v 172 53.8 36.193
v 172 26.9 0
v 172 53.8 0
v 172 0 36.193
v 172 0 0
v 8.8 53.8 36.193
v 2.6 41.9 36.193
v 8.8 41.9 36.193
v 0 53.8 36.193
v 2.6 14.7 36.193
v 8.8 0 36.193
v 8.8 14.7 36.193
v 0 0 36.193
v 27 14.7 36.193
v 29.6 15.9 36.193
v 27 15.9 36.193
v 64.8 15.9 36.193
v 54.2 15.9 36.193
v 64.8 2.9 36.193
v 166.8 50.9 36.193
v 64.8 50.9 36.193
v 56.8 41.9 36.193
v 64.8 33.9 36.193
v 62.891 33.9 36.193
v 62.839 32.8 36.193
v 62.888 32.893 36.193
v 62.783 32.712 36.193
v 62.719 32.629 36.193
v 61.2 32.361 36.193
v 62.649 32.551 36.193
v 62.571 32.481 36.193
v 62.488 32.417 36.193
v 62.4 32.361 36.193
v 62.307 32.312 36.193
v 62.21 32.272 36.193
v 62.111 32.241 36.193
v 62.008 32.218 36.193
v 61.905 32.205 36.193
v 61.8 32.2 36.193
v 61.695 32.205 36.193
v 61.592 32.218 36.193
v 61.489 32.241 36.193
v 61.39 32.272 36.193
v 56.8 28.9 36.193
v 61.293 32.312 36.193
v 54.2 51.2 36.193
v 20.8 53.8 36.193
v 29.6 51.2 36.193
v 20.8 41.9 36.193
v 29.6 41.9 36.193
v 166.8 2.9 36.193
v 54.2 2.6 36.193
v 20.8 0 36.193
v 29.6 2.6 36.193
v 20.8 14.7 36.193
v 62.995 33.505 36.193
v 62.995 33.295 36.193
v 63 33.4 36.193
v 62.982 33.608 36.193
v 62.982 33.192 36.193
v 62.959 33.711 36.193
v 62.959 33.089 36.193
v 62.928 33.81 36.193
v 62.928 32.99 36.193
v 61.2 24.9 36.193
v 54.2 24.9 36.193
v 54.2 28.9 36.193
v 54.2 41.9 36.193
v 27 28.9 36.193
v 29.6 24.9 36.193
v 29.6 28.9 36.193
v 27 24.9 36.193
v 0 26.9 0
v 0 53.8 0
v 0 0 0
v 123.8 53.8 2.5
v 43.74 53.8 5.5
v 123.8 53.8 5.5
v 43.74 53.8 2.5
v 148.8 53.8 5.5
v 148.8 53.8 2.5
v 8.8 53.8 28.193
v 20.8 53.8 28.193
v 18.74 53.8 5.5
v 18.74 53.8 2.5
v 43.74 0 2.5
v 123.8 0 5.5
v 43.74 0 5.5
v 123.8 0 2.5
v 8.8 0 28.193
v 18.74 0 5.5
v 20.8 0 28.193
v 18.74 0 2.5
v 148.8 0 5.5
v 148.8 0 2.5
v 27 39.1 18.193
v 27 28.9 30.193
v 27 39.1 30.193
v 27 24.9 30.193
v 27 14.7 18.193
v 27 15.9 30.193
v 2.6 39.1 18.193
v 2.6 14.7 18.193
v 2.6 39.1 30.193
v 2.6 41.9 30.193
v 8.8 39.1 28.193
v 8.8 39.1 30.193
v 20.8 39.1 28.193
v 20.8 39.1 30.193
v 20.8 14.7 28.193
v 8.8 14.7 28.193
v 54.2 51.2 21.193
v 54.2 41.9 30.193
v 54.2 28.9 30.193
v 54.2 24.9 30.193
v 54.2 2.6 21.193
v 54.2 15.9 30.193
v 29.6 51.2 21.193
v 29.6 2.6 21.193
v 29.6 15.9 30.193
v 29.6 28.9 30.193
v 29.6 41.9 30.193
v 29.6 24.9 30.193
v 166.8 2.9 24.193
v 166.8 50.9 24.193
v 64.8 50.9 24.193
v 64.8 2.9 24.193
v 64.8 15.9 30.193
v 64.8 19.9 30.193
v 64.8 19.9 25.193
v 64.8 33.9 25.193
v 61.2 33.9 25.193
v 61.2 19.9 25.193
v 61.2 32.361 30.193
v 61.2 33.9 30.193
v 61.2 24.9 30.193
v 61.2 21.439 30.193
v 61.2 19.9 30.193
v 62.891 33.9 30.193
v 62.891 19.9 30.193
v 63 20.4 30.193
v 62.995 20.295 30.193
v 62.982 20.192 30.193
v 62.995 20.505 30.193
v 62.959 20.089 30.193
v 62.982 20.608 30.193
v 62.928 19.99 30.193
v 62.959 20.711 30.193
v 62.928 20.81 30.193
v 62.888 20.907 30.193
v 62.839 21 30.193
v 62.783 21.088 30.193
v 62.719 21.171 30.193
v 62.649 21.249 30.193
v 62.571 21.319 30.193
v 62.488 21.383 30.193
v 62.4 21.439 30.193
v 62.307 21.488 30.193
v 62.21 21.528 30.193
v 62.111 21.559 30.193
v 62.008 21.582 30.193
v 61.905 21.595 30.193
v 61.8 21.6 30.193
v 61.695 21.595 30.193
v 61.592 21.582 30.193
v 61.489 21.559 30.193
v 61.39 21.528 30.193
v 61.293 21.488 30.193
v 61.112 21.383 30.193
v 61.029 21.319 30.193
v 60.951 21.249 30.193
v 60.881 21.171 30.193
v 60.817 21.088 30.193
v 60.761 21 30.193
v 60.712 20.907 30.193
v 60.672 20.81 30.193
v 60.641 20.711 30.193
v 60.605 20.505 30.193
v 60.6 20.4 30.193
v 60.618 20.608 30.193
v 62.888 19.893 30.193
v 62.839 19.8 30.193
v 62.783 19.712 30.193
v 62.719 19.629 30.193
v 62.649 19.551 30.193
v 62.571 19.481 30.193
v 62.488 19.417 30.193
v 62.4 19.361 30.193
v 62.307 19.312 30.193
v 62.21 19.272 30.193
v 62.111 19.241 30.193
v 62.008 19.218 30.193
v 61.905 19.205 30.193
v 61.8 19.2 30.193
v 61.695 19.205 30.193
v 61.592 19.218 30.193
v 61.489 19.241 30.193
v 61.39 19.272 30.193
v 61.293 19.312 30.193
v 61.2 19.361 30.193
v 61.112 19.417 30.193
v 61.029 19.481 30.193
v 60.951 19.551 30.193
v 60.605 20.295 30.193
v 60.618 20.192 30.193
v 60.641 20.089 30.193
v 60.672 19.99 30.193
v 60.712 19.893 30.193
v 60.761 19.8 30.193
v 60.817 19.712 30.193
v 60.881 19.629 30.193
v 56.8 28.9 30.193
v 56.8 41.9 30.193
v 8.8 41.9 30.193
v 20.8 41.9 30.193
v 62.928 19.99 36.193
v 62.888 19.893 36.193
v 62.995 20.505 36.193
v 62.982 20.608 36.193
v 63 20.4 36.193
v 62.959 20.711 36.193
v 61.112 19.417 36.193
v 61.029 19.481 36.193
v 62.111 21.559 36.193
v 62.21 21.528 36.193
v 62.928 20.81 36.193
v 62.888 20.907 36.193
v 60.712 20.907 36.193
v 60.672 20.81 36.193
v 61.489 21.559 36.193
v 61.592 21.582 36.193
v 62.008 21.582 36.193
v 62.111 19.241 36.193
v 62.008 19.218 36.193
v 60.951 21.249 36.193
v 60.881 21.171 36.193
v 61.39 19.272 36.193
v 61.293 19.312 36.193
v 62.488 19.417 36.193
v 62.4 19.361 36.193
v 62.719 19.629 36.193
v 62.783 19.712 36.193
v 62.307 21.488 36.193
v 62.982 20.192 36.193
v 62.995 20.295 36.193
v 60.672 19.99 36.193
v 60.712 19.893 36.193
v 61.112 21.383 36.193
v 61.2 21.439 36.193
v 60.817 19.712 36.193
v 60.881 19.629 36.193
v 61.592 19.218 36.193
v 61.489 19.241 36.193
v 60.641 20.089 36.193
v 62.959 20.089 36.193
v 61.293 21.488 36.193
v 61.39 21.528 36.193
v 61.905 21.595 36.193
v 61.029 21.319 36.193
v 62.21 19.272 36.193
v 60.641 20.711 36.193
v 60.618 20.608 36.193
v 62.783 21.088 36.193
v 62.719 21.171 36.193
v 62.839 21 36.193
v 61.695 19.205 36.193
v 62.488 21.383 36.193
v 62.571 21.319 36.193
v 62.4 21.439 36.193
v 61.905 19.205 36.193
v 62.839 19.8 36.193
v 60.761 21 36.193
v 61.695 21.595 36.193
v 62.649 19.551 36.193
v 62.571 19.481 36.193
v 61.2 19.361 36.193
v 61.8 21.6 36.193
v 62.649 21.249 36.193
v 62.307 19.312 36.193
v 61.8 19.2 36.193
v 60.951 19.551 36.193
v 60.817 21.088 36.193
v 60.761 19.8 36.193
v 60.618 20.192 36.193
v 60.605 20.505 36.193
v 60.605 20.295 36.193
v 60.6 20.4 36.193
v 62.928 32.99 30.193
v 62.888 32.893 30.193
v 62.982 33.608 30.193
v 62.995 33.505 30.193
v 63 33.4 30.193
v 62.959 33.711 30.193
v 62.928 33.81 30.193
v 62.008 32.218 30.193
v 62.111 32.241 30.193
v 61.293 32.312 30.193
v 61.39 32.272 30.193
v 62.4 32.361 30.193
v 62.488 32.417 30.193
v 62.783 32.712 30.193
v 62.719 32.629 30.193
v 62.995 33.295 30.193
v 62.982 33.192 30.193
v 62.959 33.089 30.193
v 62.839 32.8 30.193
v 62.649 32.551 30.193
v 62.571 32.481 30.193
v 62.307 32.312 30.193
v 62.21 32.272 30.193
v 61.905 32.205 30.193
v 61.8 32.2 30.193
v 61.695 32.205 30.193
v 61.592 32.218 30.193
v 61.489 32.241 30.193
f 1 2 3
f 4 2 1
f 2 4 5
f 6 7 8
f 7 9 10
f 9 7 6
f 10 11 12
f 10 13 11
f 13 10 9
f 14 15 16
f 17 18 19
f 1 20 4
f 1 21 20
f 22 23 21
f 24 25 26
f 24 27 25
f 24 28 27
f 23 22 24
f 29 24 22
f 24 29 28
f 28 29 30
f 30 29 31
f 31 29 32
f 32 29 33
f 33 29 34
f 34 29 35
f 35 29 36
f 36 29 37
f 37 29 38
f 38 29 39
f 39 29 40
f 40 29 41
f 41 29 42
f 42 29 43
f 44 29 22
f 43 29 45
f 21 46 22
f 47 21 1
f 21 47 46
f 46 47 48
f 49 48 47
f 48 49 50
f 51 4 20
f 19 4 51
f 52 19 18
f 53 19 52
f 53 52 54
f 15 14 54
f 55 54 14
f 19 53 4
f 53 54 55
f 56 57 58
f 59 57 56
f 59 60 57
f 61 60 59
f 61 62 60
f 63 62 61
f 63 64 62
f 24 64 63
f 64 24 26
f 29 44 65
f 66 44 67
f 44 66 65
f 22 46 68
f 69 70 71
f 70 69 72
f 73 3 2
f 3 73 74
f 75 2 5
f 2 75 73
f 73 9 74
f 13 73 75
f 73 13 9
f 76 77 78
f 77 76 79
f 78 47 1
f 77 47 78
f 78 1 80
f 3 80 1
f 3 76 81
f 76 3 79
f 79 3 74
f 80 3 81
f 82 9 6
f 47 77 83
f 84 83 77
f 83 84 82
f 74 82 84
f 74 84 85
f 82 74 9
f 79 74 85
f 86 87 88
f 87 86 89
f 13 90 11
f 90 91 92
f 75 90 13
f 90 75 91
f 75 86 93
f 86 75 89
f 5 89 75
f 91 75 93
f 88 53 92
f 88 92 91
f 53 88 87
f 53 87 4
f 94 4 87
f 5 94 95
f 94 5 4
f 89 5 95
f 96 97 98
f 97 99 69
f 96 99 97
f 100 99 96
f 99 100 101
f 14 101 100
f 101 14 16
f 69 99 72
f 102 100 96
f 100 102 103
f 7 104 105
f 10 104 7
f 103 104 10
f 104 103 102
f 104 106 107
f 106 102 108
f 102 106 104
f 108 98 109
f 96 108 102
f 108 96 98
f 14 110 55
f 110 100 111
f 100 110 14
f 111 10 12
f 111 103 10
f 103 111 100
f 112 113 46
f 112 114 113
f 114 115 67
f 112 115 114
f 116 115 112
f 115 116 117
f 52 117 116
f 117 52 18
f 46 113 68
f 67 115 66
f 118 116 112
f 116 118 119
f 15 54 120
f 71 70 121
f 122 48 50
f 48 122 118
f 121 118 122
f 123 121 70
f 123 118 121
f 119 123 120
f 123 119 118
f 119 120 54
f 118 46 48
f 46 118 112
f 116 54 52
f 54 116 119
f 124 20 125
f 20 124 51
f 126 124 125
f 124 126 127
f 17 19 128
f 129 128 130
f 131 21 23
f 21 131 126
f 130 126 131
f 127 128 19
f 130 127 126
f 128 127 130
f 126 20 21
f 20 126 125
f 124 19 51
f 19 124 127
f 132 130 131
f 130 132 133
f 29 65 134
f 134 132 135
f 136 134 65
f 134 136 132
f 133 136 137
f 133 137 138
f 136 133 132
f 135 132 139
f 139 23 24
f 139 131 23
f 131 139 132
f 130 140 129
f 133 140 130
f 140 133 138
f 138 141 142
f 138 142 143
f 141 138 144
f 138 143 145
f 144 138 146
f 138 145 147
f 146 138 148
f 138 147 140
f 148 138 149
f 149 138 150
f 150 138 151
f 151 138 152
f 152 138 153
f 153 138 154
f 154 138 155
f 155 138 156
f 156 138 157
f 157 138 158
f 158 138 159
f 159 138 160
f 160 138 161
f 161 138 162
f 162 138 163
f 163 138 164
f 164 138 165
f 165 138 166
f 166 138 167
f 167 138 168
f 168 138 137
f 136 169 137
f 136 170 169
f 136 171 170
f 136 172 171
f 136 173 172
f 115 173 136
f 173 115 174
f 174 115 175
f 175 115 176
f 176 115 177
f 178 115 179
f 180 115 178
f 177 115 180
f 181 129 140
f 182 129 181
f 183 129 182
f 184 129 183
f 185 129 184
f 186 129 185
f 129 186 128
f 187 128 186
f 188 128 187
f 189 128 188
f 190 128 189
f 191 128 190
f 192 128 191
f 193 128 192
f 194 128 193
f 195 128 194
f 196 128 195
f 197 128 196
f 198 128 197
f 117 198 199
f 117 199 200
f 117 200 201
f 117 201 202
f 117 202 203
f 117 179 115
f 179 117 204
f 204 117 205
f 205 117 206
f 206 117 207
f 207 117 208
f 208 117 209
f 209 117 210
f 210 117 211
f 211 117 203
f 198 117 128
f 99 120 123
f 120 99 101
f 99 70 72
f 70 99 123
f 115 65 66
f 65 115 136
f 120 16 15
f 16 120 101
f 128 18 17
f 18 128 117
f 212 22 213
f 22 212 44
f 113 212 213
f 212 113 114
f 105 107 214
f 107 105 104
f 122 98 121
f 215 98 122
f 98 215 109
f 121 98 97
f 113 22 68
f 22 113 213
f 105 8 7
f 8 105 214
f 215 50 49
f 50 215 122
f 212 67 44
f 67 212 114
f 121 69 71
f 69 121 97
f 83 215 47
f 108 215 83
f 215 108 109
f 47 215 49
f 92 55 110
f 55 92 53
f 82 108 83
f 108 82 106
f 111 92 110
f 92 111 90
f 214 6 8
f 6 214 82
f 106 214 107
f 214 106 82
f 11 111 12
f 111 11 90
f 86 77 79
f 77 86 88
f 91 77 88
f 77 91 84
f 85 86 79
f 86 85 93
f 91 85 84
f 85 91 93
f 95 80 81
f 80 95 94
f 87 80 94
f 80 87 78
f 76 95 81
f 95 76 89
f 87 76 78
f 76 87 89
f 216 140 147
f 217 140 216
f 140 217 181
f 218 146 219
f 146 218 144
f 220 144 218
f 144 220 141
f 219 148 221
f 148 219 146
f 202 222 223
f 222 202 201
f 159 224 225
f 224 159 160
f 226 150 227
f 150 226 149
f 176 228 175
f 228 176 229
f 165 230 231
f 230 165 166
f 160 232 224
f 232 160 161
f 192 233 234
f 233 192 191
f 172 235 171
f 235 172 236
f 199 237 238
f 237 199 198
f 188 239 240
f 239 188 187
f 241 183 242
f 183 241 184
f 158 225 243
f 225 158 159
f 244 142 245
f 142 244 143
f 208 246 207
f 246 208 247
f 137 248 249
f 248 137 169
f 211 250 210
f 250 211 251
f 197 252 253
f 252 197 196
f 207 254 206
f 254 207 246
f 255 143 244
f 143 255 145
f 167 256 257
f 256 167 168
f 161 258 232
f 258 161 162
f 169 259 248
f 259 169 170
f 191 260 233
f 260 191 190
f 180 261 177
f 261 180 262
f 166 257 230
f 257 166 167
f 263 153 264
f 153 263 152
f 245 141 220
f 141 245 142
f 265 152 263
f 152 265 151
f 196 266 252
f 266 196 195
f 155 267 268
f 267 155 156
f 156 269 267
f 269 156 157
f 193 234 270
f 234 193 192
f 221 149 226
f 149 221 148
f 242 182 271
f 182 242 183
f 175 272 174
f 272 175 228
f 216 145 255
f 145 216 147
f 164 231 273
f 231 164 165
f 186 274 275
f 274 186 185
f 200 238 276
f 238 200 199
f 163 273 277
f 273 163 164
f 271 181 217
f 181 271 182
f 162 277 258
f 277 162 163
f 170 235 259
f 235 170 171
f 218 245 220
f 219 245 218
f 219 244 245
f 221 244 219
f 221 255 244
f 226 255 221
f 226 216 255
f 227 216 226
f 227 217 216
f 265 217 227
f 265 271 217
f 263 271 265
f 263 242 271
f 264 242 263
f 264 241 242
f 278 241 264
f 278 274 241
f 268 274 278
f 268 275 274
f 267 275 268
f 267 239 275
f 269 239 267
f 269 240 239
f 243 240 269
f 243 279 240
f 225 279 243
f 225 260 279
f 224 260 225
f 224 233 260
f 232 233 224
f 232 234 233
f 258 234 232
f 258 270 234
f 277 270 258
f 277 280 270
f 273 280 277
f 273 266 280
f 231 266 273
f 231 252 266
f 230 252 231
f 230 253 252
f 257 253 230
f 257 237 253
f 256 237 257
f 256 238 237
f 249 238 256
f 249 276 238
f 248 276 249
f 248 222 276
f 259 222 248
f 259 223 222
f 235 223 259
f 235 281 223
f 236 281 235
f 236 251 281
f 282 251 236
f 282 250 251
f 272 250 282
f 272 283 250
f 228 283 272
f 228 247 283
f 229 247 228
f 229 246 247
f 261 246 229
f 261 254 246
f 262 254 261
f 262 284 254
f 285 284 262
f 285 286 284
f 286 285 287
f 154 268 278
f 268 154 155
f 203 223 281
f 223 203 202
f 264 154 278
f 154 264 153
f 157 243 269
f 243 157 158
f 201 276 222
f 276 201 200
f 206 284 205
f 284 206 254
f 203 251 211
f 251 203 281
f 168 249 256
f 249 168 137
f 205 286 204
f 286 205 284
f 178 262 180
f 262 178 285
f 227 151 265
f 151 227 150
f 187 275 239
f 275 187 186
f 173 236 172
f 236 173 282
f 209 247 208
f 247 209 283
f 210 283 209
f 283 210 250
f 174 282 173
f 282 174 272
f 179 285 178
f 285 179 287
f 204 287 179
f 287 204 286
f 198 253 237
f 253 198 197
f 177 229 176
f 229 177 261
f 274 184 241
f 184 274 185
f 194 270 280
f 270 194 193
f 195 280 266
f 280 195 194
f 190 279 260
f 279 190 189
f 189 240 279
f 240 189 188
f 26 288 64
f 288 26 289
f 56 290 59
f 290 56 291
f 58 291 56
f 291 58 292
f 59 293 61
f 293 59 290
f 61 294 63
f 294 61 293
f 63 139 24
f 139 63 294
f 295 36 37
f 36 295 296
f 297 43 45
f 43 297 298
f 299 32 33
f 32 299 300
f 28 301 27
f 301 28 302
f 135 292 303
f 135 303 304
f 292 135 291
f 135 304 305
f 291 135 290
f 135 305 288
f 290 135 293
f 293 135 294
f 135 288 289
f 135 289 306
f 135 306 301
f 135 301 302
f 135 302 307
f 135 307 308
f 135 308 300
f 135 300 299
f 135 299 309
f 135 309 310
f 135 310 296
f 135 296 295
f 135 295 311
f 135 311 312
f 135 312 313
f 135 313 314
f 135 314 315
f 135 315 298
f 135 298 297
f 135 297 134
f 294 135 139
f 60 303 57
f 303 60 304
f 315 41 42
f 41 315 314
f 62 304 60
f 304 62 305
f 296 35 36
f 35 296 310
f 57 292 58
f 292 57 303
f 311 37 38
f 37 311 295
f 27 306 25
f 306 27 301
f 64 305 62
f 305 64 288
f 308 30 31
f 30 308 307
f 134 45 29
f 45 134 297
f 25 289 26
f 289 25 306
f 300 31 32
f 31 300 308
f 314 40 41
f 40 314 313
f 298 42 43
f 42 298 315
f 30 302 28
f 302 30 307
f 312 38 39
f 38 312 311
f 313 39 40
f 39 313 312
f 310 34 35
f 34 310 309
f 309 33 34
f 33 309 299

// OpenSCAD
// ============================================================================
//  Wrist / forearm HUD bracer  —  VESC AI Tuner
//  A curved forearm cradle that carries BOTH:
//    • the HUD set  (AtomS3R 24x24 + 2x M5 Puzzle 8x8 landscape 48x24)  near the wrist
//    • the battery  (USB-C power bank / flat LiPo)                      near the elbow
//  joined by an internal CABLE CHANNEL (USB-C power + Grove data).
//
//  Why a forearm bracer (not a wristwatch): the power bank + Puzzle panel are
//  too big/heavy for the wrist. On the forearm the pack lays flat, the HUD sits
//  by the wrist tilted toward your face — a natural glance while riding, no
//  helmet combiner optics needed. Read-only telemetry (ESP-NOW), same firmware
//  as the helmet HUD [[helmet-hud-concept]].
//
//  Usage:  open in OpenSCAD → caliper the MEASURE params → set `part` →
//          F5 preview, F6 render, export STL.  Print each part separately.
//
//  Print:  PETG (tough + heat/sun stable; PLA warps/softens on skin+sun),
//          0.2 mm layer, 4 perimeters, 25-30% infill, brim on. No supports for
//          the tray if printed cavity-up; bezel + lid print flat.
// ============================================================================

part = "tray";        // "tray" | "bezel" | "battery_lid"   (export one at a time)

/* ================= MEASURE THESE (caliper) ================= */
arm_dia   = 62;       // forearm diameter where you'll wear it (across) -> saddle radius
// --- AtomS3R (the HUD "brain": ESP-NOW rx + IMU + 0.85" screen + top button) ---
atom_w    = 24.4;     // + a hair clearance
atom_h    = 24.4;
atom_t    = 18.0;     // body depth (into the tray)
atom_win  = 15.0;     // screen window (square-ish over the 0.85")
atom_btn  = 8.0;      // top button access hole
// --- panel = 2x M5 Puzzle 8x8, mounted LANDSCAPE 16w x 8h (24x24x15 each) ---
puz_w     = 48.6;     // 2 x 24 + tol  (this runs ACROSS the forearm)
puz_h     = 24.6;     // (this runs ALONG the forearm)
puz_t     = 15.0;
puz_lip   = 2.5;      // front retaining lip so LEDs show but panel can't fall out
// --- battery: default = slim USB-C power bank (Anker Nano 5K ~ MEASURE!). ---
//     Lighter alt (recommended for wrist): flat LiPo 103450 ~ 52 x 34 x 11.
bat_l     = 102;      // along the forearm
bat_w     = 48;       // across
bat_t     = 12;       // thickness (pocket depth)
bat_port  = 14;       // opening for the pack's USB-C OUT port (on the wrist-side end)

/* ================= WIRING ================= */
usbc_ch   = 9;        // width of the recessed USB-C power run (pack -> AtomS3R)
grove_ch  = 13;       // width of the Grove data run (AtomS3R G2 -> Puzzle chain)
strain    = true;     // add little strain-relief posts flanking cable exits

/* ================= STRAPS ================= */
strap_w   = 25;       // hook-and-loop webbing width
strap_t   = 3.0;      // webbing thickness (slot height)

/* ================= build constants ================= */
wall   = 2.6;
gap    = 8;           // dead space between HUD block and battery pocket (for the cable bend)
$fn    = 72;
eps    = 0.01;

R      = arm_dia/2;                          // saddle radius
W      = max(puz_w, bat_w, atom_w) + 2*wall; // tray width (across arm)
hud_L  = puz_h + atom_h + 3*wall;            // HUD block length (Puzzle then AtomS3R)
L      = hud_L + gap + bat_l + 2*wall;       // total length (wrist -> elbow)
edge_h = R - sqrt(max(R*R - (W/2)*(W/2), 1));// how high the saddle rails rise at the edges
top_z  = edge_h + max(puz_t, atom_t, bat_t) + wall;   // flat top surface height

// concave underside that hugs the forearm (saddle floor centered at z=0)
module arm_saddle(extra=0){
  translate([-1, W/2, -R])
    rotate([0,90,0])
      cylinder(r = R + extra, h = L + 2);
}

// horizontal webbing slot through both side rails at X=x
module strap_slot(x){
  translate([x - strap_w/2, -1, 2.5])
    cube([strap_w, W + 2, strap_t]);
}

/* ---------------- Part A: the bracer tray ---------------- */
module tray(){
  // X layout (0 = wrist end): [AtomS3R][Puzzle] | gap | [battery ....] elbow
  atom_x0 = wall;
  puz_x0  = atom_x0 + atom_h + wall;
  bat_x0  = hud_L + gap;

  difference(){
    // solid body
    cube([L, W, top_z]);

    // 1) forearm saddle (concave underside + cradling rails)
    arm_saddle();

    // 2) AtomS3R pocket (open top) + screen already faces up
    translate([atom_x0, (W-atom_w)/2, top_z - atom_t])
      cube([atom_h, atom_w, atom_t + eps]);

    // 3) Puzzle pocket (open top)
    translate([puz_x0, (W-puz_w)/2, top_z - puz_t])
      cube([puz_h, puz_w, puz_t + eps]);

    // 4) battery pocket (open top)
    translate([bat_x0, (W-bat_w)/2, top_z - bat_t])
      cube([bat_l, bat_w, bat_t + eps]);

    // 5) battery USB-C OUT port window (wrist-side end wall of the pack)
    translate([bat_x0 - wall - 1, W/2 - bat_port/2, top_z - bat_t + 1])
      cube([wall + 2, bat_port, bat_t]);

    // 6) CABLE CHANNEL — power (USB-C) run: battery -> AtomS3R, offset one side
    translate([atom_x0, W/2 - usbc_ch - 2, top_z - 6])
      cube([bat_x0 + 4, usbc_ch, 7]);
    // 7) CABLE CHANNEL — Grove data run: AtomS3R -> Puzzle, other side
    translate([atom_x0, W/2 + 2, top_z - 6])
      cube([puz_x0 + puz_h, grove_ch, 7]);

    // 8) AtomS3R side notch so its own USB-C / Grove pigtail can exit
    translate([atom_x0 + atom_h/2 - 6, -1, top_z - 8])
      cube([12, W + 2, 9]);

    // 9) two strap slots (near wrist, near elbow)
    strap_slot(hud_L * 0.55);
    strap_slot(L - bat_l*0.35);
  }

  // strain-relief posts flanking the channel mouth at the battery end
  if (strain){
    for (s = [-1, 1])
      translate([bat_x0 - 3, W/2 + s*(usbc_ch/2 + 2), top_z - 6])
        cylinder(d = 2.4, h = 6);
  }
}

/* ---------------- Part B: snap bezel over the HUD ---------------- */
// thin frame that clips down over AtomS3R + Puzzle to retain them, with windows.
module bezel(){
  bz_L = hud_L; bz_t = 2.4; clip = 4;
  difference(){
    union(){
      cube([bz_L, W, bz_t]);
      // side clips that grip the tray rails
      for (s=[0,1]) translate([0, s*(W-wall), -clip]) cube([bz_L, wall, clip+bz_t]);
    }
    // AtomS3R screen window + button hole
    translate([wall + atom_h/2, W/2, -1]) cube([atom_win, atom_win, bz_t+2], center=true);
    translate([wall + atom_h/2 + atom_win/2 + atom_btn/2, W/2, -1])
      cylinder(d=atom_btn, h=bz_t+2);
    // Puzzle LED window (inside the retaining lip)
    translate([atom_h + wall + puz_lip, (W-puz_w)/2 + puz_lip, -1])
      cube([puz_h - 2*puz_lip, puz_w - 2*puz_lip, bz_t+2]);
  }
}

/* ---------------- Part C: battery lid ---------------- */
// light cover so the pack can't pop out; still held down by the elbow strap.
module battery_lid(){
  ld_L = bat_l + 2*wall; ld_W = bat_w + 2*wall; ld_t = 2.4;
  difference(){
    union(){
      cube([ld_L, ld_W, ld_t]);
      for (s=[0,1]) translate([0, s*(ld_W-wall), -4]) cube([ld_L, wall, 4+ld_t]);
    }
    // vent slots (heat + weight)
    for (i=[1:4]) translate([ld_L*i/5 - 3, ld_W*0.2, -1]) cube([6, ld_W*0.6, ld_t+2]);
    // strap slot passthrough
    translate([ld_L/2 - strap_w/2, -1, -1]) cube([strap_w, ld_W+2, ld_t+2]);
  }
}

if      (part == "tray")        tray();
else if (part == "bezel")       bezel();
else if (part == "battery_lid") battery_lid();
